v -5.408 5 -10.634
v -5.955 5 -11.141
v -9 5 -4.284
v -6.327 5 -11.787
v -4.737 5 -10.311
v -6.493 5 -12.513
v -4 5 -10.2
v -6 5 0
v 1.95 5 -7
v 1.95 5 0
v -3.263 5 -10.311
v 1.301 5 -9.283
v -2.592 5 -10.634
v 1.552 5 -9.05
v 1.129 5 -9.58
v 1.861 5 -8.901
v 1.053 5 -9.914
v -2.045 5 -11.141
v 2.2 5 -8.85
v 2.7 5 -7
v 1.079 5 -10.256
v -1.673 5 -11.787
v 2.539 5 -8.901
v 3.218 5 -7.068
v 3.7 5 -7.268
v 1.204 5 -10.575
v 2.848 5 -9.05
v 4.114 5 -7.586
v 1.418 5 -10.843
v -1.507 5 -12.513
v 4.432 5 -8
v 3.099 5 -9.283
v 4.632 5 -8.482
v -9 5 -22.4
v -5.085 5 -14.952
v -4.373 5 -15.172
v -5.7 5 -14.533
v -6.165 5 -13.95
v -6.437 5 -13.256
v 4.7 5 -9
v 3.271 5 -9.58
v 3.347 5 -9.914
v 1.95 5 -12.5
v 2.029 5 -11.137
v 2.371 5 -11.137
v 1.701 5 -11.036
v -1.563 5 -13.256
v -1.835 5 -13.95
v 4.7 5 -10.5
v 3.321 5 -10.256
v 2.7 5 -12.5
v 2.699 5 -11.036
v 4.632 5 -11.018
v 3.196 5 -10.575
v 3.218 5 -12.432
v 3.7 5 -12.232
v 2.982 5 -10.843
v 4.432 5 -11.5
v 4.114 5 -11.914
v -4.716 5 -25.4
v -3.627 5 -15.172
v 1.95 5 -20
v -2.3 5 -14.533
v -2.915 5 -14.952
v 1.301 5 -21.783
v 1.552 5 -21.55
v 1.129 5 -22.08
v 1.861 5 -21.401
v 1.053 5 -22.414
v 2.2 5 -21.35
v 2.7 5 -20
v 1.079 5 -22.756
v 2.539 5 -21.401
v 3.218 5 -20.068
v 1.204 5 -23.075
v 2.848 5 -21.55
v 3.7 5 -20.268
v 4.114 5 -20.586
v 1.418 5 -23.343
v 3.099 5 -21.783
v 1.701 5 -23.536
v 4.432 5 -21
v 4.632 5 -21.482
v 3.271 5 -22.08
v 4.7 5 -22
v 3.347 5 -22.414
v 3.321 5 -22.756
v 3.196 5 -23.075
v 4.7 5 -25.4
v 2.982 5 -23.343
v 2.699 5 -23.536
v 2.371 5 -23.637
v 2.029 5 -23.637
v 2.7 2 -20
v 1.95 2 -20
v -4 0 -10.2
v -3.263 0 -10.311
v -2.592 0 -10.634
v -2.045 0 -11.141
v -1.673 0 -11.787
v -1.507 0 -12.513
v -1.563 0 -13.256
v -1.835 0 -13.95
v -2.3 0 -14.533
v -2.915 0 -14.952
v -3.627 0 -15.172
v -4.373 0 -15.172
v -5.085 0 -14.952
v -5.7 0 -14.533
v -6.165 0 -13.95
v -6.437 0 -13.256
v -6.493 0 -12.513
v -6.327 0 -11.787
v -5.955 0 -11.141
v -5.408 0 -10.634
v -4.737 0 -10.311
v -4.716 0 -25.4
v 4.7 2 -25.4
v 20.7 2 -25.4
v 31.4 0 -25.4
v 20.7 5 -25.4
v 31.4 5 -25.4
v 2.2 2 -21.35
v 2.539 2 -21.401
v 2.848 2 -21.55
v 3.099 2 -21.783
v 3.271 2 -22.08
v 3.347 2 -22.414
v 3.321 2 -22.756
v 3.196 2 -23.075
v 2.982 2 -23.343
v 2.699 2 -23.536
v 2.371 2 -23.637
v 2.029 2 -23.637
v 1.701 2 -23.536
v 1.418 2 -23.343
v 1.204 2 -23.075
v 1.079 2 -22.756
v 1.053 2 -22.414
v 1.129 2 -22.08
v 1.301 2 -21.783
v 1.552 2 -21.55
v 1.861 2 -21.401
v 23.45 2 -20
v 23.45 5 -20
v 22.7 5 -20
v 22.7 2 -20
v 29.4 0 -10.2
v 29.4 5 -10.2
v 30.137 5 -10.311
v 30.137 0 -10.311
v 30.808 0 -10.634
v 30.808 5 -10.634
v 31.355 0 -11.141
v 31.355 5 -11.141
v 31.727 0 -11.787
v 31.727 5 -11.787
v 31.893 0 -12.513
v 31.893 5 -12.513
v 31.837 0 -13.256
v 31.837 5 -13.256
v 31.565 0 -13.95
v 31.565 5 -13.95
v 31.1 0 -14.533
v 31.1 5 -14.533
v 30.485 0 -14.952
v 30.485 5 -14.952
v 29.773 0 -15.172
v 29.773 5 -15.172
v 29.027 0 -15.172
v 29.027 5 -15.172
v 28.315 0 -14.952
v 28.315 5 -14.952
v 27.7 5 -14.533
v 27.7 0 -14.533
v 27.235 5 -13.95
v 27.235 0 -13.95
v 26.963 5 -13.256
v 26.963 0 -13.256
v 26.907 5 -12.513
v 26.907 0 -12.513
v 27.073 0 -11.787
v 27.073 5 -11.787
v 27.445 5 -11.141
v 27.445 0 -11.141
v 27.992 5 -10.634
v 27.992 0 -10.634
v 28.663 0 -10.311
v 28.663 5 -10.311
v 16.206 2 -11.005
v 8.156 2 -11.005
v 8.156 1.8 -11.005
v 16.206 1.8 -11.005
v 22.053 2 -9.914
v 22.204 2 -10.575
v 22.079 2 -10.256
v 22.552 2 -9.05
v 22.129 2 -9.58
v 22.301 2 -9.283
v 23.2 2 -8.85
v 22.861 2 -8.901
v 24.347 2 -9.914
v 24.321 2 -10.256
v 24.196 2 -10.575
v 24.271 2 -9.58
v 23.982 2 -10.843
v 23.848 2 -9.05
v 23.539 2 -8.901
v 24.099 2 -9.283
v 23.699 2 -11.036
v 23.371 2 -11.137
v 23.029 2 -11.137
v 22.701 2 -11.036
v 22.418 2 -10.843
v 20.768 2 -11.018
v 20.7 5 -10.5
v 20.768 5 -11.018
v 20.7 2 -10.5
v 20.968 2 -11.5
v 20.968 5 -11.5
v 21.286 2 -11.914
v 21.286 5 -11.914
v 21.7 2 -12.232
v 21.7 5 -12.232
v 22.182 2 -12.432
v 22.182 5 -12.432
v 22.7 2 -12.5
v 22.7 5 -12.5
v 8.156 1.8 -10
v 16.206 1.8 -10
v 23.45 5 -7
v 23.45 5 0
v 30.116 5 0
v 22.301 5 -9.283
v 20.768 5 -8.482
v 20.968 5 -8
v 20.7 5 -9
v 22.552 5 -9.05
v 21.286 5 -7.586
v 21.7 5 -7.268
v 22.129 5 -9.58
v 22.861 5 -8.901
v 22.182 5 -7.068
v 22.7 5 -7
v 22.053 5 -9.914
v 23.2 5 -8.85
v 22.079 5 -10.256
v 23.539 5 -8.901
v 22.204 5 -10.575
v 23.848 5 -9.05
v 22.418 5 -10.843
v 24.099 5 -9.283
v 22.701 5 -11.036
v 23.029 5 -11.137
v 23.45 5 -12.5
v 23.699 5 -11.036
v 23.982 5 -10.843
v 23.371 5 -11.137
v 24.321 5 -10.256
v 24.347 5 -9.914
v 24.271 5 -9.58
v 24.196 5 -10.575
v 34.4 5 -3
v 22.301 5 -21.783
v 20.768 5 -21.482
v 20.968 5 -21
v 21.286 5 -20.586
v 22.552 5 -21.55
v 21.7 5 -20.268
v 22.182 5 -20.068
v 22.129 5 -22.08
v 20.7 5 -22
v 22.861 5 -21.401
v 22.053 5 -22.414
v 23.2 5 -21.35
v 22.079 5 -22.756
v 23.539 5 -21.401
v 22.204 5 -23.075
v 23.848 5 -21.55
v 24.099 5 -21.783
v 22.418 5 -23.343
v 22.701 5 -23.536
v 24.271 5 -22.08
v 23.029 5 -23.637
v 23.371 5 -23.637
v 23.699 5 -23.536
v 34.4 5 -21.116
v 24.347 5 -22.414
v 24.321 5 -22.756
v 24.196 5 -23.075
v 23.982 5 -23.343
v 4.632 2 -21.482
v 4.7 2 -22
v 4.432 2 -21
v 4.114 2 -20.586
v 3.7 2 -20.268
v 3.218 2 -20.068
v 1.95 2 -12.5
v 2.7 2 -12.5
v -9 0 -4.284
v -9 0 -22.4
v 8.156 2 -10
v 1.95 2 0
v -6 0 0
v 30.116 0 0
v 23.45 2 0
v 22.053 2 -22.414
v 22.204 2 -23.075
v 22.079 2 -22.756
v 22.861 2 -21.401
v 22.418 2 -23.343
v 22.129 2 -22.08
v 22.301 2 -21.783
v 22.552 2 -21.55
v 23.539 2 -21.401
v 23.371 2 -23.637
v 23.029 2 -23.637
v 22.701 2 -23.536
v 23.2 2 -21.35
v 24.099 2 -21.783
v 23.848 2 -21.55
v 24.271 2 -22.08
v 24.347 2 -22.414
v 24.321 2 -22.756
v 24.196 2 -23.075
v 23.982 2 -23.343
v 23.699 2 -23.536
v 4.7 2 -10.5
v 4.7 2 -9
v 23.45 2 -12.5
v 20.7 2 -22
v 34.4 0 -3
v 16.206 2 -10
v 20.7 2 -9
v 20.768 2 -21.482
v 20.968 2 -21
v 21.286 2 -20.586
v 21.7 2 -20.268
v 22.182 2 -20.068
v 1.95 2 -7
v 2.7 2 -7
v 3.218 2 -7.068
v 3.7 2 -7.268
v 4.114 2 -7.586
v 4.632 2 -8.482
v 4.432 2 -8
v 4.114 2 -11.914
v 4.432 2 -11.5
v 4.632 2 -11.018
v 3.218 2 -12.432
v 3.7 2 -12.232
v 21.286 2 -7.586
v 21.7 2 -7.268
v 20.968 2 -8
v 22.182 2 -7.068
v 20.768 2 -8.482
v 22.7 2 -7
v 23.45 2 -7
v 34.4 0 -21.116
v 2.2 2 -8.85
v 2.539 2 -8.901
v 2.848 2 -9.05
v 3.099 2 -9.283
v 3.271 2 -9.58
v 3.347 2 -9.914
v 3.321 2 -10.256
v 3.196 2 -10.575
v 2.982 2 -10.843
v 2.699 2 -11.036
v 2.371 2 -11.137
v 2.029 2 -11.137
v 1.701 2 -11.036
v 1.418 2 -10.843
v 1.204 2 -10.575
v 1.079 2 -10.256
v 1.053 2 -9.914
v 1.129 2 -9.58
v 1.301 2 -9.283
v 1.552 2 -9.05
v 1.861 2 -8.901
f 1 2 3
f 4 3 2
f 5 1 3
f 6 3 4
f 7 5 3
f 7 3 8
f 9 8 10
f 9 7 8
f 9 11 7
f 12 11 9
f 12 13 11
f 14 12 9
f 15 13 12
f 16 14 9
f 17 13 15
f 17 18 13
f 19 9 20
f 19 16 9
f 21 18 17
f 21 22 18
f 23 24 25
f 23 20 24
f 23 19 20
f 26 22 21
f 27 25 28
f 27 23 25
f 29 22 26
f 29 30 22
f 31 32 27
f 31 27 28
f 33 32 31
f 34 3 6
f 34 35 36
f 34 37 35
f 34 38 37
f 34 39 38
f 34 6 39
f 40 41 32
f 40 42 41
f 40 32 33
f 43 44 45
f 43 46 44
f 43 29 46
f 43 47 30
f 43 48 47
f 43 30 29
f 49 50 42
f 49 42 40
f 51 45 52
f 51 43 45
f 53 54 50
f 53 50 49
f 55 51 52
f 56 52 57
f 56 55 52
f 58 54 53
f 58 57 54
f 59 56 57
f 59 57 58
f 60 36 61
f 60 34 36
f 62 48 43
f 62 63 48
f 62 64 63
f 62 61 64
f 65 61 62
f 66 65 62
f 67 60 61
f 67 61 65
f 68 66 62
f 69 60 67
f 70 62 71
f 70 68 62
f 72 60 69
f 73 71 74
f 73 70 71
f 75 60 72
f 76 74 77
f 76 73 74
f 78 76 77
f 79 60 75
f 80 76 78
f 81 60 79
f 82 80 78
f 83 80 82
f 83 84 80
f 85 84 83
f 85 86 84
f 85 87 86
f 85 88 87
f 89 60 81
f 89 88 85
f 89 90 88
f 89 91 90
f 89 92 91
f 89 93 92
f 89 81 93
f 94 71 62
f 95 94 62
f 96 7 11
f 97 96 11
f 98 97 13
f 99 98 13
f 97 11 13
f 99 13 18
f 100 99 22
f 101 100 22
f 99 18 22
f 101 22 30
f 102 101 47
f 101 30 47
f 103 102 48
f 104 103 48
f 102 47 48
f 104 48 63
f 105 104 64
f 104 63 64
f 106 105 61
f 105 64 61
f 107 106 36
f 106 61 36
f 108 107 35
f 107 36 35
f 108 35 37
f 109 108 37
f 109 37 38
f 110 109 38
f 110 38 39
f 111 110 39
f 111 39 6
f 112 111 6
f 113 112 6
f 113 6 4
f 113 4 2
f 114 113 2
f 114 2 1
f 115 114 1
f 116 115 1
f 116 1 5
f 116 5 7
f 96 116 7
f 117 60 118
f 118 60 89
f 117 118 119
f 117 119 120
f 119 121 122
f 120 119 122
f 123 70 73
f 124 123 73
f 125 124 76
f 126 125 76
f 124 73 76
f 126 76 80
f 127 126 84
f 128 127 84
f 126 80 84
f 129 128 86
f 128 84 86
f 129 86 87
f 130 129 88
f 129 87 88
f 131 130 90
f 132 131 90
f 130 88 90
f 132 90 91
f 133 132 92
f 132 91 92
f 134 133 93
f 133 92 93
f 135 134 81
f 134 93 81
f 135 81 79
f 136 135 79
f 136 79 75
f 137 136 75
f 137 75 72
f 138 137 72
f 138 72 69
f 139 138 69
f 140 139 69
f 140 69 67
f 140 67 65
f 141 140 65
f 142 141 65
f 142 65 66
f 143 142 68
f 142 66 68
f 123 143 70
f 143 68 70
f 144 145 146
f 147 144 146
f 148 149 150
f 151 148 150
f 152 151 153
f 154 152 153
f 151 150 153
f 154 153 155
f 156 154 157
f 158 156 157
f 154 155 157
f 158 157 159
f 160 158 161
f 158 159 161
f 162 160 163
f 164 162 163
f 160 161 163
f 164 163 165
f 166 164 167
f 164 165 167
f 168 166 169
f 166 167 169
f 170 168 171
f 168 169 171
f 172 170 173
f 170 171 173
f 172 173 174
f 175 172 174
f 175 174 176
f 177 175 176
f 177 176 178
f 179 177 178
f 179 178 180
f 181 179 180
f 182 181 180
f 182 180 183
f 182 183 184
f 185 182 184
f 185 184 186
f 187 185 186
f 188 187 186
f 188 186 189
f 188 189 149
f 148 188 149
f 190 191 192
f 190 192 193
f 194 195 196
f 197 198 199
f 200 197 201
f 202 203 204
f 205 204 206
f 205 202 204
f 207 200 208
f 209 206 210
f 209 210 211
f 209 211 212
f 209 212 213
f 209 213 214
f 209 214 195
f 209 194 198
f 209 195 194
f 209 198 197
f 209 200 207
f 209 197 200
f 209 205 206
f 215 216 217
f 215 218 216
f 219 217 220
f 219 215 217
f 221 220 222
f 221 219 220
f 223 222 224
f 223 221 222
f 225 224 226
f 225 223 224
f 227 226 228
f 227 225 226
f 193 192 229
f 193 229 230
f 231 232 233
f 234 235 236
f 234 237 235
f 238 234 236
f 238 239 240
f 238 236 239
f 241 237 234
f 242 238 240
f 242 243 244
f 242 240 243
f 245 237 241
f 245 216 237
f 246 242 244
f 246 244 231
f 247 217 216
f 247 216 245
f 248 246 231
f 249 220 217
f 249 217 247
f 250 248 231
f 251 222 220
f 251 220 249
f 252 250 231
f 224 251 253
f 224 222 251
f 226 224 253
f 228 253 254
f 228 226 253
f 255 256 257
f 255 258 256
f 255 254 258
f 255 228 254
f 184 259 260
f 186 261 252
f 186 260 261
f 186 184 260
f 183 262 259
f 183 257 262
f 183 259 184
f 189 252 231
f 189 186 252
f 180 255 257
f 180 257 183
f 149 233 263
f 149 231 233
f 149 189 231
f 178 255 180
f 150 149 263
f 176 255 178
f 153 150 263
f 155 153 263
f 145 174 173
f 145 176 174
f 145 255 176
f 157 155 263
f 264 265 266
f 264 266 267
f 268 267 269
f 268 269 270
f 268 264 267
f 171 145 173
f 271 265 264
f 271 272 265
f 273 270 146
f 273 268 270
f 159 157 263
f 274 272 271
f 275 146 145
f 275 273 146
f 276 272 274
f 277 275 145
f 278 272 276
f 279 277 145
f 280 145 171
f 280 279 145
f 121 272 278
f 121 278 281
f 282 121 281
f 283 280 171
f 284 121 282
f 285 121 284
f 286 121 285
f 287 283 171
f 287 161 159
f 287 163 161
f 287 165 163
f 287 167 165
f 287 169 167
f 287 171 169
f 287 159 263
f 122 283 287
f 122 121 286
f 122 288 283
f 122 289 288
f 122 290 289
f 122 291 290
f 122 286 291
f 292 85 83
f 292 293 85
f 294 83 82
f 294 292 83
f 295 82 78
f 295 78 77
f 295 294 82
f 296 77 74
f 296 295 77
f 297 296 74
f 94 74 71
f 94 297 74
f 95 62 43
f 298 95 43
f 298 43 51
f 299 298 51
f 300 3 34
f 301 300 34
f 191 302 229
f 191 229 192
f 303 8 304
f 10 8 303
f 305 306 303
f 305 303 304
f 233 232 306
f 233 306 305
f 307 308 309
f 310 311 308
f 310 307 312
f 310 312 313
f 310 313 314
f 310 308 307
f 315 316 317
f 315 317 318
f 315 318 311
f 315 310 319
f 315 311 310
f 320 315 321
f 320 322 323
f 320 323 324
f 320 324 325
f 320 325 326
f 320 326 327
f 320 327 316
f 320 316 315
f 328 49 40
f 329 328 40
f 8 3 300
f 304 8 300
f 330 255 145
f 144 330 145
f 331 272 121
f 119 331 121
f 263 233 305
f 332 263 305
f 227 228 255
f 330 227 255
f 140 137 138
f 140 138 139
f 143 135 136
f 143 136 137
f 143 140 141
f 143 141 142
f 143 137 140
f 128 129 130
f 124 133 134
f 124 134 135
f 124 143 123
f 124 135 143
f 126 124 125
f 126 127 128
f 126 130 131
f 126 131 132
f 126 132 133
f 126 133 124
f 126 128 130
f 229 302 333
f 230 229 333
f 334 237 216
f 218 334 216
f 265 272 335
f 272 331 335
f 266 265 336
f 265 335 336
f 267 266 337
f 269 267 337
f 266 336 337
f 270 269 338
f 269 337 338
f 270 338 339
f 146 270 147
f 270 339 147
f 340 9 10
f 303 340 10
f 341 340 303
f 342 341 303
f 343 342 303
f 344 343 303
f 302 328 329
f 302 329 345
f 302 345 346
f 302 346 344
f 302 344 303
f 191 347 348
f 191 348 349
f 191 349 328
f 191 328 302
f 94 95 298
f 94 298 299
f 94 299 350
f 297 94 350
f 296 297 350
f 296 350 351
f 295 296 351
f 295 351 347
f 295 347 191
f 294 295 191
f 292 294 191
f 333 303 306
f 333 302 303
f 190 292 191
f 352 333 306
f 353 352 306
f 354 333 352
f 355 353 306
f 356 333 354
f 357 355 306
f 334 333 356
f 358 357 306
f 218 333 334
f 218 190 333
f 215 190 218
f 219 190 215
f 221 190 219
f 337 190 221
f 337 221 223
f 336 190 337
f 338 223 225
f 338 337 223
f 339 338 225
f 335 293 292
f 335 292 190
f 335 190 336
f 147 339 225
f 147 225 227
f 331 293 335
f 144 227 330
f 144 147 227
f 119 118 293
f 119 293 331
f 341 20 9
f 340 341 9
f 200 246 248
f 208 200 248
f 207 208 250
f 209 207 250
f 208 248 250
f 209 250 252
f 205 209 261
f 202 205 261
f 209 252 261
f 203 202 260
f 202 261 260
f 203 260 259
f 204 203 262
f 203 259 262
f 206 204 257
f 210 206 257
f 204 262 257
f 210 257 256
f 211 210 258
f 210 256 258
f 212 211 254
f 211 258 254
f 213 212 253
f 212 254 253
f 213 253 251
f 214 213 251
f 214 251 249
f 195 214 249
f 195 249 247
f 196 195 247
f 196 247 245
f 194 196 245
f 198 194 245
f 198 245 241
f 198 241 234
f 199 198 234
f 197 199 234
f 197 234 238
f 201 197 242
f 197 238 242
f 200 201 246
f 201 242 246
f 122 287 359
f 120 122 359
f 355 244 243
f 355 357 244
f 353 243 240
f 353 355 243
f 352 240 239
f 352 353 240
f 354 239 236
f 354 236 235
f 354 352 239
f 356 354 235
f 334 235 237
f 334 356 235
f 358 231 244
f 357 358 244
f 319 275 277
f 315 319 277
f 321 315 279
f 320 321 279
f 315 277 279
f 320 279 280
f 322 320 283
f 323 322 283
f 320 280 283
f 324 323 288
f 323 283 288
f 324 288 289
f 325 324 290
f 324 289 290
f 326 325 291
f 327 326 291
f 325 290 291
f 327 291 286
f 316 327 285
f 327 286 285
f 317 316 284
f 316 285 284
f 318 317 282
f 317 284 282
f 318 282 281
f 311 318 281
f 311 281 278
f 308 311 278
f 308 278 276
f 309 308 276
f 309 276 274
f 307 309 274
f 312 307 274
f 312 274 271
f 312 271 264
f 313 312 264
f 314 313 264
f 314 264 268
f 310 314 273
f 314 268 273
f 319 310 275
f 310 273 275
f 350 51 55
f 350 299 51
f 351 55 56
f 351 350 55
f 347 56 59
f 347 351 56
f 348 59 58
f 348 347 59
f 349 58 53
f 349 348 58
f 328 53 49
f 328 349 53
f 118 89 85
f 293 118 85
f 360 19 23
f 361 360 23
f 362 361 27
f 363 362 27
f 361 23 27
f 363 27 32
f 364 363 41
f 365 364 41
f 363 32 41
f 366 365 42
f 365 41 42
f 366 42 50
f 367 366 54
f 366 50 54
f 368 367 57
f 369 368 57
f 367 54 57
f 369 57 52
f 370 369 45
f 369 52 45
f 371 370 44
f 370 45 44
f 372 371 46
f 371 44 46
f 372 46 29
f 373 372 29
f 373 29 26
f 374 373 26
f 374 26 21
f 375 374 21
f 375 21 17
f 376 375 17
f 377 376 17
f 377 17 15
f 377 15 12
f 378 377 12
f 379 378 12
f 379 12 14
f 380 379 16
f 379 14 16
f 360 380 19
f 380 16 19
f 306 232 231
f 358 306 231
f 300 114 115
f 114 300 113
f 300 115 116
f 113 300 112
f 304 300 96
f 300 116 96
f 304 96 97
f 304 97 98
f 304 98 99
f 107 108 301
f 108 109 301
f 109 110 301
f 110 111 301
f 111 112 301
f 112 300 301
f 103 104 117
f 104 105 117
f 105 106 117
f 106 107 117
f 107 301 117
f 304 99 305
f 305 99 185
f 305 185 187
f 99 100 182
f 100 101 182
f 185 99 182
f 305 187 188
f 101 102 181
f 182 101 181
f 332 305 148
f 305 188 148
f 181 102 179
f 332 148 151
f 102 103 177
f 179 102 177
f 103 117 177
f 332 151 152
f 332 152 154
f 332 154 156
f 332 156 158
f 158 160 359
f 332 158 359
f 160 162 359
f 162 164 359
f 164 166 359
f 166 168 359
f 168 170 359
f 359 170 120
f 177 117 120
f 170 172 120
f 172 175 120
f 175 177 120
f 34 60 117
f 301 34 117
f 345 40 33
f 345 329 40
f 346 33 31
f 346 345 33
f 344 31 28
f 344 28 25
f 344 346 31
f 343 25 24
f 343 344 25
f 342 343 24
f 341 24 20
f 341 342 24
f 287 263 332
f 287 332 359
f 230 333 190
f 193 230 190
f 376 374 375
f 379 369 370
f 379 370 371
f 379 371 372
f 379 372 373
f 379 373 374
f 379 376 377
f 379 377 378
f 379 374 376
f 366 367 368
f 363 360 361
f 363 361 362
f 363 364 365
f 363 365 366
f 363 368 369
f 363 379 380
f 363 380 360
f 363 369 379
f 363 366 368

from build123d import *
from OCP.BRepFilletAPI import BRepFilletAPI_MakeChamfer

# Parameters (mm, degrees)
SKETCH2_W           = 25.4
SKETCH2_H           = 25.4
BOSS_EXTRUDE6_DEPTH = 5
BOSS_EXTRUDE7_DEPTH = 5
FILLET1_R           = 5
SKETCH5_R           = 1
CUT_EXTRUDE1_DEPTH  = 5
SKETCH6_W           = 28.098270468
SKETCH6_H           = 9.80175879
CUT_EXTRUDE2_DEPTH  = 49.905214446
SKETCH7_W           = 43.4
SKETCH7_H           = 25.4
SKETCH7_R           = 2.5
BOSS_EXTRUDE8_DEPTH = 5
SKETCH8_R           = 2.5
CUT_EXTRUDE3_DEPTH  = 10
SKETCH9_R           = 1.15
CUT_EXTRUDE4_DEPTH  = 3
FILLET2_R           = 2
CHAMFER1_SIZE       = 3
CHAMFER1_SIZE2      = 4.28444402
SKETCH10_W          = 8.049726934
SKETCH10_H          = 1.005360961
CUT_EXTRUDE5_DEPTH  = 0.2


with BuildPart() as part:
    # Sketch2 → Boss-Extrude6 (new body)
    with BuildSketch(Plane(origin=(0, 0, 0), x_dir=(1, 0, 0), z_dir=(0, 1, 0))):
        with Locations((12.7, 12.7)):
            Rectangle(SKETCH2_W, SKETCH2_H)
    extrude(amount=BOSS_EXTRUDE6_DEPTH)

    # Sketch4 → Boss-Extrude7 (add)
    with BuildSketch(Plane.XZ):
        with BuildLine():
            Line((25.4, 0), (25.4, -9.7))
            ThreePointArc((25.4, -9.7), (34.4, -12.7), (25.4, -15.7))
            Line((25.4, -15.7), (25.4, -25.4))
            Line((25.4, -25.4), (15.7, -25.4))
            ThreePointArc((15.7, -25.4), (12.7, -34.4), (9.7, -25.4))
            Line((9.7, -25.4), (0, -25.4))
            Line((0, -25.4), (0, -15.7))
            ThreePointArc((0, -15.7), (-9, -12.7), (0, -9.7))
            Line((0, -9.7), (0, 0))
            Line((0, 0), (9.7, 0))
            Line((9.7, 0), (15.7, 0))
            Line((15.7, 0), (25.4, 0))
        make_face()
    extrude(amount=-BOSS_EXTRUDE7_DEPTH)

    # Fillet1
    fillet1_edges = [part.edges().sort_by_distance(p)[0] for p in [
        (25.4, 2.5, -9.7),
        (25.4, 2.5, -15.7),
        (15.7, 2.5, -25.4),
        (9.7, 2.5, -25.4),
        (0, 2.5, -15.7),
        (0, 2.5, -9.7),
    ]]
    fillet(fillet1_edges, radius=FILLET1_R)

    # Sketch5 → Cut-Extrude1 (cut)
    with BuildSketch(Plane(origin=(0, 5, 0), x_dir=(1, 0, 0), z_dir=(0, 1, 0))):
        with Locations(Location((-4, 12.7, 0), (0, 0, 270))):
            Circle(SKETCH5_R)
        with Locations(Location((12.7, 29.4, 0), (0, 0, 270))):
            Circle(SKETCH5_R)
        with Locations(Location((29.4, 12.7, 0), (0, 0, 270))):
            Circle(SKETCH5_R)
    extrude(amount=-CUT_EXTRUDE1_DEPTH, mode=Mode.SUBTRACT)

    # Sketch6 → Cut-Extrude2 (cut, through all)
    with BuildSketch(Plane(origin=(0, 5, 0), x_dir=(1, 0, 0), z_dir=(0, 1, 0))):
        with Locations((14.049135234, 30.300879395)):
            Rectangle(SKETCH6_W, SKETCH6_H)
    extrude(amount=-CUT_EXTRUDE2_DEPTH, mode=Mode.SUBTRACT)

    # Sketch7 → Boss-Extrude8 (add)
    with BuildSketch(Plane(origin=(0, 5, 0), x_dir=(1, 0, 0), z_dir=(0, 1, 0))):
        with Locations((12.7, 12.7)):
            Rectangle(SKETCH7_W, SKETCH7_H)
        with Locations((-4, 12.7)):
            Circle(SKETCH7_R, mode=Mode.SUBTRACT)
        with Locations((29.4, 12.7)):
            Circle(SKETCH7_R, mode=Mode.SUBTRACT)
    extrude(amount=-BOSS_EXTRUDE8_DEPTH)

    # Sketch8 → Cut-Extrude3 (cut)
    with BuildSketch(Plane(origin=(0, 5, 0), x_dir=(1, 0, 0), z_dir=(0, 1, 0))):
        with Locations(Location((-4, 12.7, 0), (0, 0, 270))):
            Circle(SKETCH8_R)
        with Locations(Location((29.4, 12.7, 0), (0, 0, 270))):
            Circle(SKETCH8_R)
    extrude(amount=-CUT_EXTRUDE3_DEPTH, mode=Mode.SUBTRACT)

    # Sketch9 → Cut-Extrude4 (cut)
    with BuildSketch(Plane(origin=(0, 5, 0), x_dir=(1, 0, 0), z_dir=(0, 1, 0))):
        with Locations(Location((2.2, 10, 0), (0, 0, 270))):
            Circle(SKETCH9_R)
        with Locations(Location((2.2, 22.5, 0), (0, 0, 270))):
            Circle(SKETCH9_R)
        with Locations(Location((23.2, 22.5, 0), (0, 0, 270))):
            Circle(SKETCH9_R)
        with Locations(Location((23.2, 10, 0), (0, 0, 270))):
            Circle(SKETCH9_R)
        Polygon((23.45, 12.5), (23.45, 20), (20.7, 20), (20.7, 25.4), (4.7, 25.4), (4.7, 20), (1.95, 20), (1.95, 12.5), (4.7, 12.5), (4.7, 7), (1.95, 7), (1.95, 0), (23.45, 0), (23.45, 7), (20.7, 7), (20.7, 12.5), align=None)
    extrude(amount=-CUT_EXTRUDE4_DEPTH, mode=Mode.SUBTRACT)

    # Fillet2
    fillet2_edges = [part.edges().sort_by_distance(p)[0] for p in [
        (20.7, 3.5, -12.5),
        (20.7, 3.5, -7),
        (4.7, 3.5, -7),
        (4.7, 3.5, -12.5),
        (4.7, 3.5, -20),
        (20.7, 3.5, -20),
    ]]
    fillet(fillet2_edges, radius=FILLET2_R)

    # Chamfer1: one chamfer whose edges measure the first distance from different faces: ONE call of the kernel's chamfer builder (chamfer() names one face for all edges)
    chamfer1_edges_1 = [part.edges().sort_by_distance(p)[0] for p in [
        (34.4, 2.5, 0),
    ]]
    chamfer1_side_1 = [part.faces().sort_by_distance(p)[0] for p in [
        (34.4, 2.5, -12.7),
    ]]
    chamfer1_edges_2 = [part.edges().sort_by_distance(p)[0] for p in [
        (-9, 2.5, 0),
    ]]
    chamfer1_side_2 = [part.faces().sort_by_distance(p)[0] for p in [
        (-8.56312931, 2.5, 0),
    ]]
    chamfer1_edges_3 = [part.edges().sort_by_distance(p)[0] for p in [
        (34.4, 2.5, -25.4),
    ]]
    chamfer1_side_3 = [part.faces().sort_by_distance(p)[0] for p in [
        (33.96312931, 2.5, -25.4),
    ]]
    chamfer1_edges_4 = [part.edges().sort_by_distance(p)[0] for p in [
        (-9, 2.5, -25.4),
    ]]
    chamfer1_side_4 = [part.faces().sort_by_distance(p)[0] for p in [
        (-9, 2.5, -12.7),
    ]]
    chamfer1 = BRepFilletAPI_MakeChamfer(part.part.solid().wrapped)
    for e in chamfer1_edges_1:
        chamfer1.Add(CHAMFER1_SIZE, CHAMFER1_SIZE2, e.wrapped, chamfer1_side_1[0].wrapped)  # the first distance lies on this face
    for e in chamfer1_edges_2:
        chamfer1.Add(CHAMFER1_SIZE, CHAMFER1_SIZE2, e.wrapped, chamfer1_side_2[0].wrapped)  # the first distance lies on this face
    for e in chamfer1_edges_3:
        chamfer1.Add(CHAMFER1_SIZE, CHAMFER1_SIZE2, e.wrapped, chamfer1_side_3[0].wrapped)  # the first distance lies on this face
    for e in chamfer1_edges_4:
        chamfer1.Add(CHAMFER1_SIZE, CHAMFER1_SIZE2, e.wrapped, chamfer1_side_4[0].wrapped)  # the first distance lies on this face
    add(Compound.cast(chamfer1.Shape()), mode=Mode.REPLACE)

    # Sketch10 → Cut-Extrude5 (cut)
    with BuildSketch(Plane(origin=(0, 2, 0), x_dir=(1, 0, 0), z_dir=(0, 1, 0))):
        with Locations((12.181188926, 10.502680481)):
            Rectangle(SKETCH10_W, SKETCH10_H)
    extrude(amount=-CUT_EXTRUDE5_DEPTH, mode=Mode.SUBTRACT)


solid = part.part
